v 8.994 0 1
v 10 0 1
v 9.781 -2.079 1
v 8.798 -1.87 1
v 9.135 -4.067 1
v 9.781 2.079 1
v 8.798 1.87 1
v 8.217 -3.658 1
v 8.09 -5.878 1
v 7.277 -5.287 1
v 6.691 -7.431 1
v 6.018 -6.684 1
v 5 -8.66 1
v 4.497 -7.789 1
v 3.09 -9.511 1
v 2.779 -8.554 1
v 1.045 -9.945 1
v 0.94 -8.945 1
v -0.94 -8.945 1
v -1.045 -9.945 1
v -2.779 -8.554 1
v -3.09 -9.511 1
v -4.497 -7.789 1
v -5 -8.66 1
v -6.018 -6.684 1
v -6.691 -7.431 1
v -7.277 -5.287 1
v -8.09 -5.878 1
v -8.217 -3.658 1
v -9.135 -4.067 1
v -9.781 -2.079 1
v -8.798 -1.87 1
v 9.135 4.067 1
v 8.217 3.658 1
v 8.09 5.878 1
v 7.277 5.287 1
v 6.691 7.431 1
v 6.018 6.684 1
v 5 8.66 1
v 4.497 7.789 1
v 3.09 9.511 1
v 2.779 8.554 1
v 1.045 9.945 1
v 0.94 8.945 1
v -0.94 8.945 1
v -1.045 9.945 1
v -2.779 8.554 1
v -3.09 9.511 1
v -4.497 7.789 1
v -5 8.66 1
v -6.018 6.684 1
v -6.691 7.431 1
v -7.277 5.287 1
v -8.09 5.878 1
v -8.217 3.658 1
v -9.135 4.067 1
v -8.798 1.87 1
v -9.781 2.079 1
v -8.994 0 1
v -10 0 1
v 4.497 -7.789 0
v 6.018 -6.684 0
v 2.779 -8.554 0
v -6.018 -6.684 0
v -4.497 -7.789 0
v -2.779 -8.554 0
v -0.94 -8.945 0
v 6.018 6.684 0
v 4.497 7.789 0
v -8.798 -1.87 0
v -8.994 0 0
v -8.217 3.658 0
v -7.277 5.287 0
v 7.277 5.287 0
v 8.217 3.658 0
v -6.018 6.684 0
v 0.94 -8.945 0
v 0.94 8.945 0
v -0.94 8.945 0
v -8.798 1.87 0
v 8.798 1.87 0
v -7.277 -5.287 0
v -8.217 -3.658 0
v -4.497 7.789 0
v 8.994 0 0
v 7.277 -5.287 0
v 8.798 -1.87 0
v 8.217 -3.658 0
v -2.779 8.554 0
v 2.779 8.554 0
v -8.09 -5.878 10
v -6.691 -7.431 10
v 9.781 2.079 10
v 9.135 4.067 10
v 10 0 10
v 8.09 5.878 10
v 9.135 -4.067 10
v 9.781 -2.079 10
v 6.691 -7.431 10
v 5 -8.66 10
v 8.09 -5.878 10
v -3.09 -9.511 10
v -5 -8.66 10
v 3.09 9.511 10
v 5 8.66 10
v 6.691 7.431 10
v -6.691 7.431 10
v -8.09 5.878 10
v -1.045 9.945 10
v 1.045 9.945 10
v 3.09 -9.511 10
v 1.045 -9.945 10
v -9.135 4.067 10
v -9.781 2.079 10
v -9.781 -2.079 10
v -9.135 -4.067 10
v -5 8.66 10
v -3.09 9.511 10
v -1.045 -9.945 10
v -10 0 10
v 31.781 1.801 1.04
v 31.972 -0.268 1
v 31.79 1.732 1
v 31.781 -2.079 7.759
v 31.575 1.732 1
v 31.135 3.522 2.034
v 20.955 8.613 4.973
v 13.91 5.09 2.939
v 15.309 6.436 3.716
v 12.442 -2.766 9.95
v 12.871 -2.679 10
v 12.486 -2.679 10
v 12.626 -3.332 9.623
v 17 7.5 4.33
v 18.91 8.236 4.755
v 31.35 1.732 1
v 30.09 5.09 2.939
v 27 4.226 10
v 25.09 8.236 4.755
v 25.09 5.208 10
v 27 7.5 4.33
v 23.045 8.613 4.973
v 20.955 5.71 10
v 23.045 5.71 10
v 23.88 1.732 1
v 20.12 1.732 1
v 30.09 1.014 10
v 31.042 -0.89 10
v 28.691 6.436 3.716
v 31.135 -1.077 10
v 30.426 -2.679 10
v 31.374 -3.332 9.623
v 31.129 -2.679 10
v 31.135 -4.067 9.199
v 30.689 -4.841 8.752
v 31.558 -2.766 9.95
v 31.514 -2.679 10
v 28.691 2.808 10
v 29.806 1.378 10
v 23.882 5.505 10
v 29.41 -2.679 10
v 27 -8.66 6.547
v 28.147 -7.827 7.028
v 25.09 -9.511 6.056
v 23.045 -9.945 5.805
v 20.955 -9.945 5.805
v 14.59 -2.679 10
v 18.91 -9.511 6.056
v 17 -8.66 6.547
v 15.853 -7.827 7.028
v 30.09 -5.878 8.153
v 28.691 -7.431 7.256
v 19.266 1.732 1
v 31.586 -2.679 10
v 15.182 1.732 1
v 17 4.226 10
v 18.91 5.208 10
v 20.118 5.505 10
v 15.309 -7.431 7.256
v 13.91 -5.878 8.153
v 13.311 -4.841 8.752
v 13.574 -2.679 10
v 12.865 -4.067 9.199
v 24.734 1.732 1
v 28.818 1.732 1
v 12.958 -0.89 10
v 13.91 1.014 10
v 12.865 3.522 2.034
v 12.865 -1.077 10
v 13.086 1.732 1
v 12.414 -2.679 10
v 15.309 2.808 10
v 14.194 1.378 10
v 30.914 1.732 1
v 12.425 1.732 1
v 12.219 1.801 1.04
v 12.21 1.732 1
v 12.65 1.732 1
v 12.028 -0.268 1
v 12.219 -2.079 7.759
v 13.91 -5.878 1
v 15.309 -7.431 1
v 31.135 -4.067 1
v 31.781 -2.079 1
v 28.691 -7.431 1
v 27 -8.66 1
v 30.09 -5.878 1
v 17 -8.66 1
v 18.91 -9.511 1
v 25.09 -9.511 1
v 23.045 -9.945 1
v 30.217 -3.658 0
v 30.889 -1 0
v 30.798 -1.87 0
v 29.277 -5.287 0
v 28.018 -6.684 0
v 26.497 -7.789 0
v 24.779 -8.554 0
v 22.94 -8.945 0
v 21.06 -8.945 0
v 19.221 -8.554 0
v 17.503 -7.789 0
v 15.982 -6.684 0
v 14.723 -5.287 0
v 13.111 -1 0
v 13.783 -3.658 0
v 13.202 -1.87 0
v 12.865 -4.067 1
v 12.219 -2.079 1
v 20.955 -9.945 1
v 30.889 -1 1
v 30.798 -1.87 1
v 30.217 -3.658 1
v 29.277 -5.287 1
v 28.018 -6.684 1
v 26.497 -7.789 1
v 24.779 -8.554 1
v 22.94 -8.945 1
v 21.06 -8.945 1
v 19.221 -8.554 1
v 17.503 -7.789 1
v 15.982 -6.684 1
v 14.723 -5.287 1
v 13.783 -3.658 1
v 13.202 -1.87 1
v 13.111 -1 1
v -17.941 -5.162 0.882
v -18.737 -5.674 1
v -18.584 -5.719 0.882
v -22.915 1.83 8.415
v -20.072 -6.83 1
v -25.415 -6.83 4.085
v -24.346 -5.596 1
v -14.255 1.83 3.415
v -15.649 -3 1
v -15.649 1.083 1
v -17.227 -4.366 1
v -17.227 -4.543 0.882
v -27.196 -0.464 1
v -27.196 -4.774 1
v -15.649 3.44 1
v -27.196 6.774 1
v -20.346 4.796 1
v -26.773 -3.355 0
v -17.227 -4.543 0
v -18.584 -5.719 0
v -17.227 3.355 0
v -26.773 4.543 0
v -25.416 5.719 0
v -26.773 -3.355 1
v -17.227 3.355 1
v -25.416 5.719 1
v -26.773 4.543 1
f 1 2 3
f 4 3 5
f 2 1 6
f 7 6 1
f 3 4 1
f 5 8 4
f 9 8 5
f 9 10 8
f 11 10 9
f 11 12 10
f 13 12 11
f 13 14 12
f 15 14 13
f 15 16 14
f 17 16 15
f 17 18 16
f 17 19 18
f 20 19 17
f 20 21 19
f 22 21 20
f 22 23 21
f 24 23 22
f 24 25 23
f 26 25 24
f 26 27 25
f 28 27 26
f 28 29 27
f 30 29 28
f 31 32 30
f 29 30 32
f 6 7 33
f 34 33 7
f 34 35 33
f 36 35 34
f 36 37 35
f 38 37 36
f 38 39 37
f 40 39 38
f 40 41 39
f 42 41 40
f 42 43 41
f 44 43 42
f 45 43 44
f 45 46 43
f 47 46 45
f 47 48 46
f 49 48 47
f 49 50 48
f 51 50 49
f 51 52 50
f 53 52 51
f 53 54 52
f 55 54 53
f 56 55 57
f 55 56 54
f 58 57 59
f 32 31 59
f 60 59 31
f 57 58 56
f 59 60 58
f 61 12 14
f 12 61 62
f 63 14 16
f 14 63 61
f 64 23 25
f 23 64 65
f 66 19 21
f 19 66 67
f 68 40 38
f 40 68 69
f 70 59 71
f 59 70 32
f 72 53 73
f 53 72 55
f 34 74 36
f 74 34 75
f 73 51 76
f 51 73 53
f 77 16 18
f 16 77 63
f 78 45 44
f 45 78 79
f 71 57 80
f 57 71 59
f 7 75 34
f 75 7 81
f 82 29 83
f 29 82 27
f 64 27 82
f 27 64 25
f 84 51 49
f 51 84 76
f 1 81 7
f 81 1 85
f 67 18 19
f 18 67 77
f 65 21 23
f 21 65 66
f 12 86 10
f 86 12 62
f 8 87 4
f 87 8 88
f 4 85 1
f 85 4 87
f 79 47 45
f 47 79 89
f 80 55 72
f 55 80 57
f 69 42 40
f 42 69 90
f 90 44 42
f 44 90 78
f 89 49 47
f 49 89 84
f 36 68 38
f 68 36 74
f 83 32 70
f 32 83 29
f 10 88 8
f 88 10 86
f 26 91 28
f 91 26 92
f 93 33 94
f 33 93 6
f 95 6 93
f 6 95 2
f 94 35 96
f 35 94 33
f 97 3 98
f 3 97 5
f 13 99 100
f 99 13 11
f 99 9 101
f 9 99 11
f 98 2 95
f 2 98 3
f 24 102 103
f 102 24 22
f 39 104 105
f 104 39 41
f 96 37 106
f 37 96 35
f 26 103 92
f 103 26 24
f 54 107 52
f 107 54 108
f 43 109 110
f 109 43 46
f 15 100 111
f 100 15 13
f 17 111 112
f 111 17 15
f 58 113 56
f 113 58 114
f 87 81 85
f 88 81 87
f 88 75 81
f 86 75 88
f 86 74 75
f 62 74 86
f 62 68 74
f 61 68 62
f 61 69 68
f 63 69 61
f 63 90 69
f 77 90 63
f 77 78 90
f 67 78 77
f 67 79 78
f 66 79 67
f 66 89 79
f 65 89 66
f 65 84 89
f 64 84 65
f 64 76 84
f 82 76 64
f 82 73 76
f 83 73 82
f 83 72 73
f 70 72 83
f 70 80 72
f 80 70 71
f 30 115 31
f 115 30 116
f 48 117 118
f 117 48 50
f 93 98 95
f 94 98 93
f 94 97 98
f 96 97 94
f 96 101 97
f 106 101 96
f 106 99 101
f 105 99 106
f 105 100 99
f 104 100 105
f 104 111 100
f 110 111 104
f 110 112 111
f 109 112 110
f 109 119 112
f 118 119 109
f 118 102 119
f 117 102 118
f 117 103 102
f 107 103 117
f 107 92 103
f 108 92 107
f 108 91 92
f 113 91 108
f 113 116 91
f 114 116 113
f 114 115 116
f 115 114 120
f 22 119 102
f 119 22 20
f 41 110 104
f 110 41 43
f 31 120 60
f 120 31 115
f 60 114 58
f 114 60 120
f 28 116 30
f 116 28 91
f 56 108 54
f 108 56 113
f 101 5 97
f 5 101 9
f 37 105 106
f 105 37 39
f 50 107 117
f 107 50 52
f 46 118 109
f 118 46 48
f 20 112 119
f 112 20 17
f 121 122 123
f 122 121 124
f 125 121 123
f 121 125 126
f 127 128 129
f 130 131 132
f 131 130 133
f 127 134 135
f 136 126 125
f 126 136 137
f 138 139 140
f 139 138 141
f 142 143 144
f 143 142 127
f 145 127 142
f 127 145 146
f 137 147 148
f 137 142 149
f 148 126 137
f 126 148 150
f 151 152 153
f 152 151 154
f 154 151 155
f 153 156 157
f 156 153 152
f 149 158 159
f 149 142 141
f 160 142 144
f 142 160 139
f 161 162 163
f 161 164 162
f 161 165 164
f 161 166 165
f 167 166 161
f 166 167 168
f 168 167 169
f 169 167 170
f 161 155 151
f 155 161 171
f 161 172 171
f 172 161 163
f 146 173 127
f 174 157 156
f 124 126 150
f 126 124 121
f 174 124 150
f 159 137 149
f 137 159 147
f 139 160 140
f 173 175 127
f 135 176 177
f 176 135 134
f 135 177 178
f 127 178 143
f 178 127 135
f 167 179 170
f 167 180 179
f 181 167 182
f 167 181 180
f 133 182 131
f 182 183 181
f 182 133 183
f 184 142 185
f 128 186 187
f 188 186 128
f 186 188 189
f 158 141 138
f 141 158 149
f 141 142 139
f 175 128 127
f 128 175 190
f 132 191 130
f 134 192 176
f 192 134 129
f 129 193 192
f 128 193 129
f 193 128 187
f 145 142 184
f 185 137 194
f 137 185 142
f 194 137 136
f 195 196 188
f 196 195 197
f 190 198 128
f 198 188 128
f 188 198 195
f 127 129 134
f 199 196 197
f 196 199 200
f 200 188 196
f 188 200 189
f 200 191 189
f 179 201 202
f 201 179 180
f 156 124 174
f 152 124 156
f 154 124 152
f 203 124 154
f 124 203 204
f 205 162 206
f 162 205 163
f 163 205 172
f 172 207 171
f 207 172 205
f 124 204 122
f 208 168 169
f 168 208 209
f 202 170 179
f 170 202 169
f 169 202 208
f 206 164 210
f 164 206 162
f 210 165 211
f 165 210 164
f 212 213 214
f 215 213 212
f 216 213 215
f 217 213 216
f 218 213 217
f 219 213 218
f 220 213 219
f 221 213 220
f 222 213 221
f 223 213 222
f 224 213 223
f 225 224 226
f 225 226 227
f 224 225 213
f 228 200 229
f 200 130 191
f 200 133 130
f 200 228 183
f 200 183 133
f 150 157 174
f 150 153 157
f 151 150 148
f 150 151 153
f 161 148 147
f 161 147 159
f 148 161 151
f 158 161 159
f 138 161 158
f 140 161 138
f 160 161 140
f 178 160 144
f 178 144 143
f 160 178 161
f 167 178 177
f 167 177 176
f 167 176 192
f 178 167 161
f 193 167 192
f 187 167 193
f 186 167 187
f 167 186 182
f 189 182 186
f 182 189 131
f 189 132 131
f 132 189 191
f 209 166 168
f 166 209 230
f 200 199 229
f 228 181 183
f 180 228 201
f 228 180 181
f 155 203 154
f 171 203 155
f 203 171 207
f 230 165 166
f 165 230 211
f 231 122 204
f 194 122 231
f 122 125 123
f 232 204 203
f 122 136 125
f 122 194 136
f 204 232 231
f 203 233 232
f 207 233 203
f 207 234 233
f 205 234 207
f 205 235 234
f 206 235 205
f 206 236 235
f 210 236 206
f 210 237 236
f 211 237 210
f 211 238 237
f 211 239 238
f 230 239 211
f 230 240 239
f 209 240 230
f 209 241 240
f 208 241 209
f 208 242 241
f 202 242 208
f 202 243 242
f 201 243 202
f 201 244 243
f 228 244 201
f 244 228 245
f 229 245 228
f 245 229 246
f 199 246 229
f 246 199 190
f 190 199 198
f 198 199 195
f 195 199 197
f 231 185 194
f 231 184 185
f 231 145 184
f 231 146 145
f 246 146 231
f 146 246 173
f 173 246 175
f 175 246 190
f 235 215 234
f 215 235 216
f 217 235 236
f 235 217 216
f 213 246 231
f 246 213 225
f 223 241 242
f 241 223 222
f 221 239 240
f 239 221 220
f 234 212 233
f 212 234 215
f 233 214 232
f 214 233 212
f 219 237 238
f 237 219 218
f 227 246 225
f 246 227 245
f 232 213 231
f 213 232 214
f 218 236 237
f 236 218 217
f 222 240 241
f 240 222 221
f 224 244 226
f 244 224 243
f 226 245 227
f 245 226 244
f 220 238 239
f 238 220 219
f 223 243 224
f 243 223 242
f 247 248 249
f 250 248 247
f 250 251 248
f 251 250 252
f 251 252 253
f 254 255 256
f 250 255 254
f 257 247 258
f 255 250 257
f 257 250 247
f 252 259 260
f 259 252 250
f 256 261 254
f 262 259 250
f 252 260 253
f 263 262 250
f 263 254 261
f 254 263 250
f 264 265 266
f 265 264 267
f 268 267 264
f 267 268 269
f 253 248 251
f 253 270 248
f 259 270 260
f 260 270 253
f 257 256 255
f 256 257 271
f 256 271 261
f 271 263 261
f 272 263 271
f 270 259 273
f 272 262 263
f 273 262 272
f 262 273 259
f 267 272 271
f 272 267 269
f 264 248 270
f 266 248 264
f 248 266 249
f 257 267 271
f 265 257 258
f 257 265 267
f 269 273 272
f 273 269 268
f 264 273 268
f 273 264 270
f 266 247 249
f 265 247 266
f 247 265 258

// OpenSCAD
// exampla 1
faska() cylinder(h=10, r=10);

// exampla 2
translate([22,0,0]) faska() intersection(){
    rotate([30,0,0]) cylinder(h=10, r=10);
    cylinder(h=10, r=10);
}

// exampla 3
translate([-22,0,0]) faska() intersection(){
    rotate([30,30,0]) cube([10,10,10], center=true);
    cylinder(h=10, r=10);
}


// =================================================
// === LIB STARTS HERE =============================
module lift(z){
    translate([0,0,z]) children();
}

module faska(){
    difference(){
       union() { children(); }
        
       lift(-1)  difference(){
            cylinder(h=2, r=100);
            
            linear_extrude(3)
                offset(r=-1, chamfer=false)
                    projection(cut=true)
                        union() { children(); };
        }
    }
}
